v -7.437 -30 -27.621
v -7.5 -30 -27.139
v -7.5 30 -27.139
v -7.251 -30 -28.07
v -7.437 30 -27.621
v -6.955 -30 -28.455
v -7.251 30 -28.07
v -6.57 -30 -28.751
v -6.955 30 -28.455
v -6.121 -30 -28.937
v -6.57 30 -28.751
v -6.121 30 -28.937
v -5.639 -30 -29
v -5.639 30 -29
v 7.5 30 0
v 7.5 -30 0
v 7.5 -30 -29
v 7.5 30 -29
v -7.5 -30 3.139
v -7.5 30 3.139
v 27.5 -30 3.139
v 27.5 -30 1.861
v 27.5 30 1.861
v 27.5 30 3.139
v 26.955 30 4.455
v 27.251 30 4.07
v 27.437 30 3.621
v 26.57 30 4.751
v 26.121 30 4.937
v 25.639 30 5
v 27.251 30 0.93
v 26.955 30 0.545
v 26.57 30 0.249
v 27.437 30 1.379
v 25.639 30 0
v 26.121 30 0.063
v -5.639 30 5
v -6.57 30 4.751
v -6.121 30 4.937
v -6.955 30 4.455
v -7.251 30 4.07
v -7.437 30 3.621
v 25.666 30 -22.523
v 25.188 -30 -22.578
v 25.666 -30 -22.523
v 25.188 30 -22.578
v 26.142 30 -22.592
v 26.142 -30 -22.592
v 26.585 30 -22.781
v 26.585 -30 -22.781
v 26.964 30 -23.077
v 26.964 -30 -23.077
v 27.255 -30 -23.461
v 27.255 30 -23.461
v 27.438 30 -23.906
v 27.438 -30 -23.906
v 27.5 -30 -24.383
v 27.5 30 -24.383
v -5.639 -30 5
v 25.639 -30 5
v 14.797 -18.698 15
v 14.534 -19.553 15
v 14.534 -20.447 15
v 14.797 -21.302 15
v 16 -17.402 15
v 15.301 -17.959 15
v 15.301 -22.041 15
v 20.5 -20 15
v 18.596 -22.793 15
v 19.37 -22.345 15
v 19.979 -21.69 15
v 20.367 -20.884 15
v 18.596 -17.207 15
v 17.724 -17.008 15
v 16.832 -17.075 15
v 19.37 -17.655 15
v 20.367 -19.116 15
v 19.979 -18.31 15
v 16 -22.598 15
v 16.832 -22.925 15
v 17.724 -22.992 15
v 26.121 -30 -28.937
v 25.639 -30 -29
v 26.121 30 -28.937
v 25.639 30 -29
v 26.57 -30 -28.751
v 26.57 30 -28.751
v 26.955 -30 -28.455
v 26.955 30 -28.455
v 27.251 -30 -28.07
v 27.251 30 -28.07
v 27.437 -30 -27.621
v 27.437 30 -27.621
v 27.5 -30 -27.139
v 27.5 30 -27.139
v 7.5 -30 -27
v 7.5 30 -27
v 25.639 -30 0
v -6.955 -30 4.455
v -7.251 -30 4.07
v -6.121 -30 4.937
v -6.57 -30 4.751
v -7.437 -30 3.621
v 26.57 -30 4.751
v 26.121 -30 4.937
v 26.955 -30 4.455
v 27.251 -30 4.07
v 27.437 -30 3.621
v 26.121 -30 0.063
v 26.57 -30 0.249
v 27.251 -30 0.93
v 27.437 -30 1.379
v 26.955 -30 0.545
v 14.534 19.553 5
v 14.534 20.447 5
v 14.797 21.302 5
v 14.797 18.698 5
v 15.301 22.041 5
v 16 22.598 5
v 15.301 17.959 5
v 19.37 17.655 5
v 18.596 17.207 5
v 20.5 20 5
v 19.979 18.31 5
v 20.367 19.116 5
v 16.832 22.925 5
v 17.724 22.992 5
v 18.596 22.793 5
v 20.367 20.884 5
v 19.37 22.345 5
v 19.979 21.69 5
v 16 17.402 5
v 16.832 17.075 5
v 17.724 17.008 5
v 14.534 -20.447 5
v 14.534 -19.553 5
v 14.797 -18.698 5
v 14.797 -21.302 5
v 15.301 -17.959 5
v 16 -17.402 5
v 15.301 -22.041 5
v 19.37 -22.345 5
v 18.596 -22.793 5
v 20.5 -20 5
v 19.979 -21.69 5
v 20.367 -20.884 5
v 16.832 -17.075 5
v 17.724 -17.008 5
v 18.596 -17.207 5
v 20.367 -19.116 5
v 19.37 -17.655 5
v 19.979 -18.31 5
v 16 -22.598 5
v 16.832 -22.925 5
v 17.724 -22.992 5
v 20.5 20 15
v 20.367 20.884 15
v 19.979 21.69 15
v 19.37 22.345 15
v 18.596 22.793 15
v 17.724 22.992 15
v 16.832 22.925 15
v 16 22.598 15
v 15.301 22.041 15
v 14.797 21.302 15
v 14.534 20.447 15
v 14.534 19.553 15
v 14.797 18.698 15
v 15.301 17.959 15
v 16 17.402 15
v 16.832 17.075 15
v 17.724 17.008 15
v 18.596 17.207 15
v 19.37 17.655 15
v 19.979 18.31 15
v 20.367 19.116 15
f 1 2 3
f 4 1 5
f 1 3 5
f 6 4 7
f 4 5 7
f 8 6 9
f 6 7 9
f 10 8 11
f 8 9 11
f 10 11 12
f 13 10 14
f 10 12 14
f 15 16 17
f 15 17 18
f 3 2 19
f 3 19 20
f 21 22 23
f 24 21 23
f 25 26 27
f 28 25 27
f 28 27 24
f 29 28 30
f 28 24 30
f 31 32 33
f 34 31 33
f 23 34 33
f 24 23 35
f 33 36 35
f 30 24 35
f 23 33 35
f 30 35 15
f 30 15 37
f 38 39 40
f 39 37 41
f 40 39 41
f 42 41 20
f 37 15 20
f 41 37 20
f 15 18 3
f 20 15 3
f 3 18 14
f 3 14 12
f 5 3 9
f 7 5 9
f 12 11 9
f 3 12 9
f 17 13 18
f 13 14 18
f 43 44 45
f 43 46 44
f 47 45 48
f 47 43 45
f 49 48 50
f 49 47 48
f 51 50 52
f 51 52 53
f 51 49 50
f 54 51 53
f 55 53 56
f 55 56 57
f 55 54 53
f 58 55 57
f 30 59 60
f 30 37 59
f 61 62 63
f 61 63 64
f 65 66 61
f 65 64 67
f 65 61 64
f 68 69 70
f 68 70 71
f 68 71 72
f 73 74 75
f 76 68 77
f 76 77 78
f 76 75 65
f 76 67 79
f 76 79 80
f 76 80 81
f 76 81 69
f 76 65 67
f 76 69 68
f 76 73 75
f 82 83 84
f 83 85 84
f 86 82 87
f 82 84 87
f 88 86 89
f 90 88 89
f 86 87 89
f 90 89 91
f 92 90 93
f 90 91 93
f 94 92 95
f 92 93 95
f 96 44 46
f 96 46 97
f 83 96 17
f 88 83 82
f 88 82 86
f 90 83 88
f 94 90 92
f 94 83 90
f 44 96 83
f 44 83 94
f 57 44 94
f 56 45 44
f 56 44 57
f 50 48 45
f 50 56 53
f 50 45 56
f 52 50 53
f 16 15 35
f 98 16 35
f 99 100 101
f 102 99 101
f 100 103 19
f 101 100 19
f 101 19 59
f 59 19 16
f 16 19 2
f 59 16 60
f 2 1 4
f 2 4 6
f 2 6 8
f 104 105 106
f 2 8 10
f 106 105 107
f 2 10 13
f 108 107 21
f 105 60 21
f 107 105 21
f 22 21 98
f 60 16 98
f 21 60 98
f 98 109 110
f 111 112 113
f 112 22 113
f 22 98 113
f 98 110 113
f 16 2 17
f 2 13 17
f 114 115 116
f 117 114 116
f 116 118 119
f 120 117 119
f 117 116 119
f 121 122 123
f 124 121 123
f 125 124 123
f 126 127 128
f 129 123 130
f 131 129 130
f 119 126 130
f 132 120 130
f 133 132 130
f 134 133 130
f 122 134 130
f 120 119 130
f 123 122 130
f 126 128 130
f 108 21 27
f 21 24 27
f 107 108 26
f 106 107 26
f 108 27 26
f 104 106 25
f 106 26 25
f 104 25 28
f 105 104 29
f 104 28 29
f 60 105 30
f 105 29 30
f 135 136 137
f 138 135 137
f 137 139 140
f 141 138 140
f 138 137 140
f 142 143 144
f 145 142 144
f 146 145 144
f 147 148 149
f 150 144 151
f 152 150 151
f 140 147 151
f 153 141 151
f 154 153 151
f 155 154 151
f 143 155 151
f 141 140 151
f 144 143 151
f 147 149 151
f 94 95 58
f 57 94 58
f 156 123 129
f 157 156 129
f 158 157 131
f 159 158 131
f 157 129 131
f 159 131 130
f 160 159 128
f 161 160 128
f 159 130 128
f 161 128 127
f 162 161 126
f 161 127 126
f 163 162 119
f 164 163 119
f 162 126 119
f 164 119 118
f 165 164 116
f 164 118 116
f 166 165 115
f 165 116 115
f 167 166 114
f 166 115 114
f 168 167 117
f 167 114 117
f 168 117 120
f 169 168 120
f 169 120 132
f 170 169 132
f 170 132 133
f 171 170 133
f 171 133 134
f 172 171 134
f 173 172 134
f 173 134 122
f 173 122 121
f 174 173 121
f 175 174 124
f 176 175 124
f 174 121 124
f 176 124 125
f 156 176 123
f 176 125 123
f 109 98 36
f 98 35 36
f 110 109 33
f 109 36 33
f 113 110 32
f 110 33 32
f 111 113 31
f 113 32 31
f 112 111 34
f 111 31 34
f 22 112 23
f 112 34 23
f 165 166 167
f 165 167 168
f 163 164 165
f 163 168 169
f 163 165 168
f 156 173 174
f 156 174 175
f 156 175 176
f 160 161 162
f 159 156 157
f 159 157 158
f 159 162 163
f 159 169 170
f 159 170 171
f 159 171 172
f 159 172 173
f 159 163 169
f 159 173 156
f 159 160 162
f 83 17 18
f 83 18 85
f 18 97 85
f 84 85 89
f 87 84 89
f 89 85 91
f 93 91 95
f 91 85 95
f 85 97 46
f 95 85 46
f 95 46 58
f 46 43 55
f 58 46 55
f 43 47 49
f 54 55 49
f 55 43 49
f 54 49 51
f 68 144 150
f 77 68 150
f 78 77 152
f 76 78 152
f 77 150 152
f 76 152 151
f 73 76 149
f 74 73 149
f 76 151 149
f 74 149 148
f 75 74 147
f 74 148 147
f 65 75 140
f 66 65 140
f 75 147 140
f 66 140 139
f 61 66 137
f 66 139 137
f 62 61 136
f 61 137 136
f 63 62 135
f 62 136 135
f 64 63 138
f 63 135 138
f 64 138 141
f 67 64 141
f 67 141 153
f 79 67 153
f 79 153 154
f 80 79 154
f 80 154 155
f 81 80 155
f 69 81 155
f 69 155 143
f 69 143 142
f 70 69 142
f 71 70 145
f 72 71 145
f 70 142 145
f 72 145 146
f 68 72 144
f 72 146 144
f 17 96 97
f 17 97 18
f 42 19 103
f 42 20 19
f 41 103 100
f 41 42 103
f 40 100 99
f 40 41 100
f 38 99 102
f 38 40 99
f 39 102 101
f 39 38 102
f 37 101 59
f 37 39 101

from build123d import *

# Parameters (mm, degrees)
F0_W     = 15
F0_H     = 60
F1_DEPTH = 29
F2_W     = 15
F2_H     = 60
F2_W_2   = 20
F3_DEPTH = 5
F4_R     = 3
F5_DEPTH = 10
F7_DEPTH = 60
F8_R     = 1.860778
F8_2_R   = 1.860778


with BuildPart() as f1:
    # F0 (on Top) → F1 (new body)
    with BuildSketch(Plane.XY):
        Rectangle(F0_W, F0_H)
    extrude(amount=-F1_DEPTH)

    # F2 (on face) → F3 (join)
    with BuildSketch(Plane.XY):
        Rectangle(F2_W, F2_H)
        with Locations((17.5, 0)):
            Rectangle(F2_W_2, F2_H)
    extrude(amount=F3_DEPTH)

    # F8#2
    f8_2_edges = [f1.edges().sort_by_distance(p)[0] for p in [
        (27.5, 0, 5),
        (27.5, 0, 0),
        (-7.5, 0, 5),
        (-7.5, 0, -29),
    ]]
    fillet(f8_2_edges, radius=F8_2_R)


with BuildPart() as f5:
    # F4 (on face) → F5 (new body)
    with BuildSketch(Plane.XY.offset(5)):
        with Locations((17.5, -20)):
            Circle(F4_R)
        with Locations((17.5, 20)):
            Circle(F4_R)
    extrude(amount=F5_DEPTH)


with BuildPart() as f7:
    # F6 (on face) → F7 (new body, through all)
    with BuildSketch(Plane.XZ.offset(30)):
        Polygon((27.5, -22), (7.5, -27), (7.5, -29), (27.5, -29), align=None)
    extrude(amount=-F7_DEPTH)

    # F8
    f8_edges = [f7.edges().sort_by_distance(p)[0] for p in [
        (27.5, 0, -22),
        (27.5, 0, -29),
    ]]
    fillet(f8_edges, radius=F8_R)


solid = Compound([f1.part, f5.part, f7.part])
